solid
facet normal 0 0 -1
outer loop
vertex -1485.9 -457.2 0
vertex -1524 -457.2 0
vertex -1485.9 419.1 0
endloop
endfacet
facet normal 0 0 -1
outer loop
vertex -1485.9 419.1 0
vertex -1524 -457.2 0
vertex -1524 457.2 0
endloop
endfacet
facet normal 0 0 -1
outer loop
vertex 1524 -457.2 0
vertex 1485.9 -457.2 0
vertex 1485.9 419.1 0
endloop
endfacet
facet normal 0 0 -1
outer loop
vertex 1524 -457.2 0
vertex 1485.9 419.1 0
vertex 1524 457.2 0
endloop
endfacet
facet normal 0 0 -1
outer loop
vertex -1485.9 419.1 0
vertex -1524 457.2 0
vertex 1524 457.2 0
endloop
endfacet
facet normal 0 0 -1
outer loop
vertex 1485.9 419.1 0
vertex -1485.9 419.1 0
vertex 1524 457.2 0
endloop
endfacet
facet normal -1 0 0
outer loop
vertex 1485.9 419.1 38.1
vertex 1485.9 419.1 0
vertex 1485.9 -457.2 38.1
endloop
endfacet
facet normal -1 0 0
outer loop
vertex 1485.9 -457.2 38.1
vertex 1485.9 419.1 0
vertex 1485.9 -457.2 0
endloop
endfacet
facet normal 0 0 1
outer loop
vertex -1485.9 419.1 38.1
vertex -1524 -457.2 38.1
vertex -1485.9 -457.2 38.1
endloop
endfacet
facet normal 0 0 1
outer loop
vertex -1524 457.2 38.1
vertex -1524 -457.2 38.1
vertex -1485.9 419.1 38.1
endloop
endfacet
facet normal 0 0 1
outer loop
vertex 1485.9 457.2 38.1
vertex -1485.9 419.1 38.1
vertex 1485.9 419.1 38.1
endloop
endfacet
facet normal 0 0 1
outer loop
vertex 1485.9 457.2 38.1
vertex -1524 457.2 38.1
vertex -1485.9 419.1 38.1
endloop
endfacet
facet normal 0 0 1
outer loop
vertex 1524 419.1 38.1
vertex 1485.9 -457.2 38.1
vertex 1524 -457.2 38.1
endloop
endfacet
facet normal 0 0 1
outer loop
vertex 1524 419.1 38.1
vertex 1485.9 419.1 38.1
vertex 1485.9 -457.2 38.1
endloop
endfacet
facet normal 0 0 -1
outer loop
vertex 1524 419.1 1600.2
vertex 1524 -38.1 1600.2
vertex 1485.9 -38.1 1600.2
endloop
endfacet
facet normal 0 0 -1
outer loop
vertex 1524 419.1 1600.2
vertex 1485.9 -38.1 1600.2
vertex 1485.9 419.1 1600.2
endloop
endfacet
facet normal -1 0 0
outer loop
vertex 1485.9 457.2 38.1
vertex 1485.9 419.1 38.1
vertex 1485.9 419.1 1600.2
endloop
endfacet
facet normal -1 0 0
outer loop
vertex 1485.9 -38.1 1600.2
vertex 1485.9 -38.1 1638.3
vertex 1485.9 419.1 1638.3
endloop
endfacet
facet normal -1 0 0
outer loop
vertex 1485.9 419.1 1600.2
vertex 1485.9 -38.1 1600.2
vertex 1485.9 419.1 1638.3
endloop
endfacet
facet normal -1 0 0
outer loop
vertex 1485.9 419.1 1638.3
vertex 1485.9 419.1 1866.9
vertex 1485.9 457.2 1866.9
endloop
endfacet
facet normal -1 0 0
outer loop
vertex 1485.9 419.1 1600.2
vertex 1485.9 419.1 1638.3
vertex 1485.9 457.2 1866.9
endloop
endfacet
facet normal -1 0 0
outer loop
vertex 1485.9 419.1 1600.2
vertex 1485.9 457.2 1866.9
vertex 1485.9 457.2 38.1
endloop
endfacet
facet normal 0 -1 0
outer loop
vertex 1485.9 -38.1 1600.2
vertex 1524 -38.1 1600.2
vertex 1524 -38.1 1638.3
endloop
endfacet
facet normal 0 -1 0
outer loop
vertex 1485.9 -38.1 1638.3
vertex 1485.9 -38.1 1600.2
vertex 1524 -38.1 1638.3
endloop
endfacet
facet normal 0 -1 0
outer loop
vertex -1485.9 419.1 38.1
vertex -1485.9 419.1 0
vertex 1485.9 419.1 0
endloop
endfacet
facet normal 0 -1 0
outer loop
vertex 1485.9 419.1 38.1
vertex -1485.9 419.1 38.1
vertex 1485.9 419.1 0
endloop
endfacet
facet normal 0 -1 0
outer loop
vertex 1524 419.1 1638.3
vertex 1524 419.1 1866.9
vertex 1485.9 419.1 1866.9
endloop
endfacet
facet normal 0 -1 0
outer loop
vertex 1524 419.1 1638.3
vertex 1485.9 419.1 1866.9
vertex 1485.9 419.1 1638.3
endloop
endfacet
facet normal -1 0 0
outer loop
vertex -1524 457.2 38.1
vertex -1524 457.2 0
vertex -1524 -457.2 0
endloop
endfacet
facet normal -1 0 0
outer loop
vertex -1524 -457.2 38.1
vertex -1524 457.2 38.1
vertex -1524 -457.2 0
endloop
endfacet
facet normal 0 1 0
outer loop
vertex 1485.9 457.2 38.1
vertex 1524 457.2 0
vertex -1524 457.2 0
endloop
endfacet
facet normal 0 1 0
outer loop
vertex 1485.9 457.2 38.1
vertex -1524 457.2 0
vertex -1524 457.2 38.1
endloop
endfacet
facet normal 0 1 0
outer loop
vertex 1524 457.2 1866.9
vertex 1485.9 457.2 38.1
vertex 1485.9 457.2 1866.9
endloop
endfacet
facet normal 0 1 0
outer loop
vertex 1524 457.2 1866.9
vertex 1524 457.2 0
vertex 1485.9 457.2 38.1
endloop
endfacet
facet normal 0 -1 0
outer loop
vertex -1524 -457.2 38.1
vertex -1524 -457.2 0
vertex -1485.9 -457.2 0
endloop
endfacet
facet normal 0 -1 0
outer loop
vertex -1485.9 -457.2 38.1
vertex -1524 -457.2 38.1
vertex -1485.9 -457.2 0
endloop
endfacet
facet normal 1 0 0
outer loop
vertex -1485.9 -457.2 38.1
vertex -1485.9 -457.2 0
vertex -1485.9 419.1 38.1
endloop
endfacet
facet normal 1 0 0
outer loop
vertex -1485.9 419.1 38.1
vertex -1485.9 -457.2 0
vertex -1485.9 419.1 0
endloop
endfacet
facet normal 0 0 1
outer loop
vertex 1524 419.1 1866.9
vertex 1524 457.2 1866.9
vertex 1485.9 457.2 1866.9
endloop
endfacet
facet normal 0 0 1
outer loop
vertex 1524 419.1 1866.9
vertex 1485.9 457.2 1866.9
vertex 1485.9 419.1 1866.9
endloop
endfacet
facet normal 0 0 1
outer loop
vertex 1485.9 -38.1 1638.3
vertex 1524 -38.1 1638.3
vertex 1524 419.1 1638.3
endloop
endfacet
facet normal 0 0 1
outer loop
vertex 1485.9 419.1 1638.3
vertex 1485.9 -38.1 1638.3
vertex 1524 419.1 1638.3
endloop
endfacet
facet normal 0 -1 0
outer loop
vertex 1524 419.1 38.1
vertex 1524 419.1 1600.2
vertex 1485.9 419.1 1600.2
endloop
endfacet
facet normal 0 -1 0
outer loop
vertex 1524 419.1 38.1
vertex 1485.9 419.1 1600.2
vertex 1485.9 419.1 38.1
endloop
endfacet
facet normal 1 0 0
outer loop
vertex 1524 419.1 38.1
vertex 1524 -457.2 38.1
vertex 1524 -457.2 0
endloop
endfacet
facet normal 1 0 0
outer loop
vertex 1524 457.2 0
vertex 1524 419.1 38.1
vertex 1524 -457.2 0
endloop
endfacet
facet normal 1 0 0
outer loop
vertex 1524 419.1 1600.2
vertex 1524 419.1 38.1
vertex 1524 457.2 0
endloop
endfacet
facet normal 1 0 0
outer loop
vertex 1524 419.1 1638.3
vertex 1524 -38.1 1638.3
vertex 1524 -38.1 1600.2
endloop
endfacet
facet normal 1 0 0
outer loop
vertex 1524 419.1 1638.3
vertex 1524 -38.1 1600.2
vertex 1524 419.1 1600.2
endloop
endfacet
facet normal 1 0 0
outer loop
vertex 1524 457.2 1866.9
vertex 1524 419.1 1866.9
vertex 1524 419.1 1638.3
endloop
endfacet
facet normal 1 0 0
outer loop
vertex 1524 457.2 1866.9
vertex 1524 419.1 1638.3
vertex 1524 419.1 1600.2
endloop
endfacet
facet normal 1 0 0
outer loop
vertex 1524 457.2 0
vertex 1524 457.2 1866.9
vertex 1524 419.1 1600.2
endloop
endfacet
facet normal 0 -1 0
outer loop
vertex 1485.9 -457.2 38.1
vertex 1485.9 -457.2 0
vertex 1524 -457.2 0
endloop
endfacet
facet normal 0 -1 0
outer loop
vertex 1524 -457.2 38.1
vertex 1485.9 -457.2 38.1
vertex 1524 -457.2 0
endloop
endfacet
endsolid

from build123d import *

# Parameters (mm, degrees)
F1_DEPTH = 38.1
F3_DEPTH = 38.1
F2_W     = 457.2
F2_H     = 38.1
F4_DEPTH = 38.1


with BuildPart() as f1:
    # F0 (on Top) → F1 (new body)
    with BuildSketch(Plane.XY):
        Polygon((1524, -457.2), (1524, 457.2), (-1524, 457.2), (-1524, -457.2), (-1485.9, -457.2), (-1485.9, 419.1), (1485.9, 419.1), (1485.9, -457.2), align=None)
    extrude(amount=F1_DEPTH)

    # F2 (on face) → F3 (join)
    with BuildSketch(Plane.YZ.offset(1524)):
        Polygon((419.1, 38.1), (457.2, 38.1), (457.2, 1866.9), (419.1, 1866.9), (419.1, 1638.3), (419.1, 1600.2), align=None)
    extrude(amount=-F3_DEPTH)

    # F2 (on face) → F4 (join)
    with BuildSketch(Plane.YZ.offset(1524)):
        with Locations((190.5, 1619.25)):
            Rectangle(F2_W, F2_H)
    extrude(amount=-F4_DEPTH)


solid = f1.part
